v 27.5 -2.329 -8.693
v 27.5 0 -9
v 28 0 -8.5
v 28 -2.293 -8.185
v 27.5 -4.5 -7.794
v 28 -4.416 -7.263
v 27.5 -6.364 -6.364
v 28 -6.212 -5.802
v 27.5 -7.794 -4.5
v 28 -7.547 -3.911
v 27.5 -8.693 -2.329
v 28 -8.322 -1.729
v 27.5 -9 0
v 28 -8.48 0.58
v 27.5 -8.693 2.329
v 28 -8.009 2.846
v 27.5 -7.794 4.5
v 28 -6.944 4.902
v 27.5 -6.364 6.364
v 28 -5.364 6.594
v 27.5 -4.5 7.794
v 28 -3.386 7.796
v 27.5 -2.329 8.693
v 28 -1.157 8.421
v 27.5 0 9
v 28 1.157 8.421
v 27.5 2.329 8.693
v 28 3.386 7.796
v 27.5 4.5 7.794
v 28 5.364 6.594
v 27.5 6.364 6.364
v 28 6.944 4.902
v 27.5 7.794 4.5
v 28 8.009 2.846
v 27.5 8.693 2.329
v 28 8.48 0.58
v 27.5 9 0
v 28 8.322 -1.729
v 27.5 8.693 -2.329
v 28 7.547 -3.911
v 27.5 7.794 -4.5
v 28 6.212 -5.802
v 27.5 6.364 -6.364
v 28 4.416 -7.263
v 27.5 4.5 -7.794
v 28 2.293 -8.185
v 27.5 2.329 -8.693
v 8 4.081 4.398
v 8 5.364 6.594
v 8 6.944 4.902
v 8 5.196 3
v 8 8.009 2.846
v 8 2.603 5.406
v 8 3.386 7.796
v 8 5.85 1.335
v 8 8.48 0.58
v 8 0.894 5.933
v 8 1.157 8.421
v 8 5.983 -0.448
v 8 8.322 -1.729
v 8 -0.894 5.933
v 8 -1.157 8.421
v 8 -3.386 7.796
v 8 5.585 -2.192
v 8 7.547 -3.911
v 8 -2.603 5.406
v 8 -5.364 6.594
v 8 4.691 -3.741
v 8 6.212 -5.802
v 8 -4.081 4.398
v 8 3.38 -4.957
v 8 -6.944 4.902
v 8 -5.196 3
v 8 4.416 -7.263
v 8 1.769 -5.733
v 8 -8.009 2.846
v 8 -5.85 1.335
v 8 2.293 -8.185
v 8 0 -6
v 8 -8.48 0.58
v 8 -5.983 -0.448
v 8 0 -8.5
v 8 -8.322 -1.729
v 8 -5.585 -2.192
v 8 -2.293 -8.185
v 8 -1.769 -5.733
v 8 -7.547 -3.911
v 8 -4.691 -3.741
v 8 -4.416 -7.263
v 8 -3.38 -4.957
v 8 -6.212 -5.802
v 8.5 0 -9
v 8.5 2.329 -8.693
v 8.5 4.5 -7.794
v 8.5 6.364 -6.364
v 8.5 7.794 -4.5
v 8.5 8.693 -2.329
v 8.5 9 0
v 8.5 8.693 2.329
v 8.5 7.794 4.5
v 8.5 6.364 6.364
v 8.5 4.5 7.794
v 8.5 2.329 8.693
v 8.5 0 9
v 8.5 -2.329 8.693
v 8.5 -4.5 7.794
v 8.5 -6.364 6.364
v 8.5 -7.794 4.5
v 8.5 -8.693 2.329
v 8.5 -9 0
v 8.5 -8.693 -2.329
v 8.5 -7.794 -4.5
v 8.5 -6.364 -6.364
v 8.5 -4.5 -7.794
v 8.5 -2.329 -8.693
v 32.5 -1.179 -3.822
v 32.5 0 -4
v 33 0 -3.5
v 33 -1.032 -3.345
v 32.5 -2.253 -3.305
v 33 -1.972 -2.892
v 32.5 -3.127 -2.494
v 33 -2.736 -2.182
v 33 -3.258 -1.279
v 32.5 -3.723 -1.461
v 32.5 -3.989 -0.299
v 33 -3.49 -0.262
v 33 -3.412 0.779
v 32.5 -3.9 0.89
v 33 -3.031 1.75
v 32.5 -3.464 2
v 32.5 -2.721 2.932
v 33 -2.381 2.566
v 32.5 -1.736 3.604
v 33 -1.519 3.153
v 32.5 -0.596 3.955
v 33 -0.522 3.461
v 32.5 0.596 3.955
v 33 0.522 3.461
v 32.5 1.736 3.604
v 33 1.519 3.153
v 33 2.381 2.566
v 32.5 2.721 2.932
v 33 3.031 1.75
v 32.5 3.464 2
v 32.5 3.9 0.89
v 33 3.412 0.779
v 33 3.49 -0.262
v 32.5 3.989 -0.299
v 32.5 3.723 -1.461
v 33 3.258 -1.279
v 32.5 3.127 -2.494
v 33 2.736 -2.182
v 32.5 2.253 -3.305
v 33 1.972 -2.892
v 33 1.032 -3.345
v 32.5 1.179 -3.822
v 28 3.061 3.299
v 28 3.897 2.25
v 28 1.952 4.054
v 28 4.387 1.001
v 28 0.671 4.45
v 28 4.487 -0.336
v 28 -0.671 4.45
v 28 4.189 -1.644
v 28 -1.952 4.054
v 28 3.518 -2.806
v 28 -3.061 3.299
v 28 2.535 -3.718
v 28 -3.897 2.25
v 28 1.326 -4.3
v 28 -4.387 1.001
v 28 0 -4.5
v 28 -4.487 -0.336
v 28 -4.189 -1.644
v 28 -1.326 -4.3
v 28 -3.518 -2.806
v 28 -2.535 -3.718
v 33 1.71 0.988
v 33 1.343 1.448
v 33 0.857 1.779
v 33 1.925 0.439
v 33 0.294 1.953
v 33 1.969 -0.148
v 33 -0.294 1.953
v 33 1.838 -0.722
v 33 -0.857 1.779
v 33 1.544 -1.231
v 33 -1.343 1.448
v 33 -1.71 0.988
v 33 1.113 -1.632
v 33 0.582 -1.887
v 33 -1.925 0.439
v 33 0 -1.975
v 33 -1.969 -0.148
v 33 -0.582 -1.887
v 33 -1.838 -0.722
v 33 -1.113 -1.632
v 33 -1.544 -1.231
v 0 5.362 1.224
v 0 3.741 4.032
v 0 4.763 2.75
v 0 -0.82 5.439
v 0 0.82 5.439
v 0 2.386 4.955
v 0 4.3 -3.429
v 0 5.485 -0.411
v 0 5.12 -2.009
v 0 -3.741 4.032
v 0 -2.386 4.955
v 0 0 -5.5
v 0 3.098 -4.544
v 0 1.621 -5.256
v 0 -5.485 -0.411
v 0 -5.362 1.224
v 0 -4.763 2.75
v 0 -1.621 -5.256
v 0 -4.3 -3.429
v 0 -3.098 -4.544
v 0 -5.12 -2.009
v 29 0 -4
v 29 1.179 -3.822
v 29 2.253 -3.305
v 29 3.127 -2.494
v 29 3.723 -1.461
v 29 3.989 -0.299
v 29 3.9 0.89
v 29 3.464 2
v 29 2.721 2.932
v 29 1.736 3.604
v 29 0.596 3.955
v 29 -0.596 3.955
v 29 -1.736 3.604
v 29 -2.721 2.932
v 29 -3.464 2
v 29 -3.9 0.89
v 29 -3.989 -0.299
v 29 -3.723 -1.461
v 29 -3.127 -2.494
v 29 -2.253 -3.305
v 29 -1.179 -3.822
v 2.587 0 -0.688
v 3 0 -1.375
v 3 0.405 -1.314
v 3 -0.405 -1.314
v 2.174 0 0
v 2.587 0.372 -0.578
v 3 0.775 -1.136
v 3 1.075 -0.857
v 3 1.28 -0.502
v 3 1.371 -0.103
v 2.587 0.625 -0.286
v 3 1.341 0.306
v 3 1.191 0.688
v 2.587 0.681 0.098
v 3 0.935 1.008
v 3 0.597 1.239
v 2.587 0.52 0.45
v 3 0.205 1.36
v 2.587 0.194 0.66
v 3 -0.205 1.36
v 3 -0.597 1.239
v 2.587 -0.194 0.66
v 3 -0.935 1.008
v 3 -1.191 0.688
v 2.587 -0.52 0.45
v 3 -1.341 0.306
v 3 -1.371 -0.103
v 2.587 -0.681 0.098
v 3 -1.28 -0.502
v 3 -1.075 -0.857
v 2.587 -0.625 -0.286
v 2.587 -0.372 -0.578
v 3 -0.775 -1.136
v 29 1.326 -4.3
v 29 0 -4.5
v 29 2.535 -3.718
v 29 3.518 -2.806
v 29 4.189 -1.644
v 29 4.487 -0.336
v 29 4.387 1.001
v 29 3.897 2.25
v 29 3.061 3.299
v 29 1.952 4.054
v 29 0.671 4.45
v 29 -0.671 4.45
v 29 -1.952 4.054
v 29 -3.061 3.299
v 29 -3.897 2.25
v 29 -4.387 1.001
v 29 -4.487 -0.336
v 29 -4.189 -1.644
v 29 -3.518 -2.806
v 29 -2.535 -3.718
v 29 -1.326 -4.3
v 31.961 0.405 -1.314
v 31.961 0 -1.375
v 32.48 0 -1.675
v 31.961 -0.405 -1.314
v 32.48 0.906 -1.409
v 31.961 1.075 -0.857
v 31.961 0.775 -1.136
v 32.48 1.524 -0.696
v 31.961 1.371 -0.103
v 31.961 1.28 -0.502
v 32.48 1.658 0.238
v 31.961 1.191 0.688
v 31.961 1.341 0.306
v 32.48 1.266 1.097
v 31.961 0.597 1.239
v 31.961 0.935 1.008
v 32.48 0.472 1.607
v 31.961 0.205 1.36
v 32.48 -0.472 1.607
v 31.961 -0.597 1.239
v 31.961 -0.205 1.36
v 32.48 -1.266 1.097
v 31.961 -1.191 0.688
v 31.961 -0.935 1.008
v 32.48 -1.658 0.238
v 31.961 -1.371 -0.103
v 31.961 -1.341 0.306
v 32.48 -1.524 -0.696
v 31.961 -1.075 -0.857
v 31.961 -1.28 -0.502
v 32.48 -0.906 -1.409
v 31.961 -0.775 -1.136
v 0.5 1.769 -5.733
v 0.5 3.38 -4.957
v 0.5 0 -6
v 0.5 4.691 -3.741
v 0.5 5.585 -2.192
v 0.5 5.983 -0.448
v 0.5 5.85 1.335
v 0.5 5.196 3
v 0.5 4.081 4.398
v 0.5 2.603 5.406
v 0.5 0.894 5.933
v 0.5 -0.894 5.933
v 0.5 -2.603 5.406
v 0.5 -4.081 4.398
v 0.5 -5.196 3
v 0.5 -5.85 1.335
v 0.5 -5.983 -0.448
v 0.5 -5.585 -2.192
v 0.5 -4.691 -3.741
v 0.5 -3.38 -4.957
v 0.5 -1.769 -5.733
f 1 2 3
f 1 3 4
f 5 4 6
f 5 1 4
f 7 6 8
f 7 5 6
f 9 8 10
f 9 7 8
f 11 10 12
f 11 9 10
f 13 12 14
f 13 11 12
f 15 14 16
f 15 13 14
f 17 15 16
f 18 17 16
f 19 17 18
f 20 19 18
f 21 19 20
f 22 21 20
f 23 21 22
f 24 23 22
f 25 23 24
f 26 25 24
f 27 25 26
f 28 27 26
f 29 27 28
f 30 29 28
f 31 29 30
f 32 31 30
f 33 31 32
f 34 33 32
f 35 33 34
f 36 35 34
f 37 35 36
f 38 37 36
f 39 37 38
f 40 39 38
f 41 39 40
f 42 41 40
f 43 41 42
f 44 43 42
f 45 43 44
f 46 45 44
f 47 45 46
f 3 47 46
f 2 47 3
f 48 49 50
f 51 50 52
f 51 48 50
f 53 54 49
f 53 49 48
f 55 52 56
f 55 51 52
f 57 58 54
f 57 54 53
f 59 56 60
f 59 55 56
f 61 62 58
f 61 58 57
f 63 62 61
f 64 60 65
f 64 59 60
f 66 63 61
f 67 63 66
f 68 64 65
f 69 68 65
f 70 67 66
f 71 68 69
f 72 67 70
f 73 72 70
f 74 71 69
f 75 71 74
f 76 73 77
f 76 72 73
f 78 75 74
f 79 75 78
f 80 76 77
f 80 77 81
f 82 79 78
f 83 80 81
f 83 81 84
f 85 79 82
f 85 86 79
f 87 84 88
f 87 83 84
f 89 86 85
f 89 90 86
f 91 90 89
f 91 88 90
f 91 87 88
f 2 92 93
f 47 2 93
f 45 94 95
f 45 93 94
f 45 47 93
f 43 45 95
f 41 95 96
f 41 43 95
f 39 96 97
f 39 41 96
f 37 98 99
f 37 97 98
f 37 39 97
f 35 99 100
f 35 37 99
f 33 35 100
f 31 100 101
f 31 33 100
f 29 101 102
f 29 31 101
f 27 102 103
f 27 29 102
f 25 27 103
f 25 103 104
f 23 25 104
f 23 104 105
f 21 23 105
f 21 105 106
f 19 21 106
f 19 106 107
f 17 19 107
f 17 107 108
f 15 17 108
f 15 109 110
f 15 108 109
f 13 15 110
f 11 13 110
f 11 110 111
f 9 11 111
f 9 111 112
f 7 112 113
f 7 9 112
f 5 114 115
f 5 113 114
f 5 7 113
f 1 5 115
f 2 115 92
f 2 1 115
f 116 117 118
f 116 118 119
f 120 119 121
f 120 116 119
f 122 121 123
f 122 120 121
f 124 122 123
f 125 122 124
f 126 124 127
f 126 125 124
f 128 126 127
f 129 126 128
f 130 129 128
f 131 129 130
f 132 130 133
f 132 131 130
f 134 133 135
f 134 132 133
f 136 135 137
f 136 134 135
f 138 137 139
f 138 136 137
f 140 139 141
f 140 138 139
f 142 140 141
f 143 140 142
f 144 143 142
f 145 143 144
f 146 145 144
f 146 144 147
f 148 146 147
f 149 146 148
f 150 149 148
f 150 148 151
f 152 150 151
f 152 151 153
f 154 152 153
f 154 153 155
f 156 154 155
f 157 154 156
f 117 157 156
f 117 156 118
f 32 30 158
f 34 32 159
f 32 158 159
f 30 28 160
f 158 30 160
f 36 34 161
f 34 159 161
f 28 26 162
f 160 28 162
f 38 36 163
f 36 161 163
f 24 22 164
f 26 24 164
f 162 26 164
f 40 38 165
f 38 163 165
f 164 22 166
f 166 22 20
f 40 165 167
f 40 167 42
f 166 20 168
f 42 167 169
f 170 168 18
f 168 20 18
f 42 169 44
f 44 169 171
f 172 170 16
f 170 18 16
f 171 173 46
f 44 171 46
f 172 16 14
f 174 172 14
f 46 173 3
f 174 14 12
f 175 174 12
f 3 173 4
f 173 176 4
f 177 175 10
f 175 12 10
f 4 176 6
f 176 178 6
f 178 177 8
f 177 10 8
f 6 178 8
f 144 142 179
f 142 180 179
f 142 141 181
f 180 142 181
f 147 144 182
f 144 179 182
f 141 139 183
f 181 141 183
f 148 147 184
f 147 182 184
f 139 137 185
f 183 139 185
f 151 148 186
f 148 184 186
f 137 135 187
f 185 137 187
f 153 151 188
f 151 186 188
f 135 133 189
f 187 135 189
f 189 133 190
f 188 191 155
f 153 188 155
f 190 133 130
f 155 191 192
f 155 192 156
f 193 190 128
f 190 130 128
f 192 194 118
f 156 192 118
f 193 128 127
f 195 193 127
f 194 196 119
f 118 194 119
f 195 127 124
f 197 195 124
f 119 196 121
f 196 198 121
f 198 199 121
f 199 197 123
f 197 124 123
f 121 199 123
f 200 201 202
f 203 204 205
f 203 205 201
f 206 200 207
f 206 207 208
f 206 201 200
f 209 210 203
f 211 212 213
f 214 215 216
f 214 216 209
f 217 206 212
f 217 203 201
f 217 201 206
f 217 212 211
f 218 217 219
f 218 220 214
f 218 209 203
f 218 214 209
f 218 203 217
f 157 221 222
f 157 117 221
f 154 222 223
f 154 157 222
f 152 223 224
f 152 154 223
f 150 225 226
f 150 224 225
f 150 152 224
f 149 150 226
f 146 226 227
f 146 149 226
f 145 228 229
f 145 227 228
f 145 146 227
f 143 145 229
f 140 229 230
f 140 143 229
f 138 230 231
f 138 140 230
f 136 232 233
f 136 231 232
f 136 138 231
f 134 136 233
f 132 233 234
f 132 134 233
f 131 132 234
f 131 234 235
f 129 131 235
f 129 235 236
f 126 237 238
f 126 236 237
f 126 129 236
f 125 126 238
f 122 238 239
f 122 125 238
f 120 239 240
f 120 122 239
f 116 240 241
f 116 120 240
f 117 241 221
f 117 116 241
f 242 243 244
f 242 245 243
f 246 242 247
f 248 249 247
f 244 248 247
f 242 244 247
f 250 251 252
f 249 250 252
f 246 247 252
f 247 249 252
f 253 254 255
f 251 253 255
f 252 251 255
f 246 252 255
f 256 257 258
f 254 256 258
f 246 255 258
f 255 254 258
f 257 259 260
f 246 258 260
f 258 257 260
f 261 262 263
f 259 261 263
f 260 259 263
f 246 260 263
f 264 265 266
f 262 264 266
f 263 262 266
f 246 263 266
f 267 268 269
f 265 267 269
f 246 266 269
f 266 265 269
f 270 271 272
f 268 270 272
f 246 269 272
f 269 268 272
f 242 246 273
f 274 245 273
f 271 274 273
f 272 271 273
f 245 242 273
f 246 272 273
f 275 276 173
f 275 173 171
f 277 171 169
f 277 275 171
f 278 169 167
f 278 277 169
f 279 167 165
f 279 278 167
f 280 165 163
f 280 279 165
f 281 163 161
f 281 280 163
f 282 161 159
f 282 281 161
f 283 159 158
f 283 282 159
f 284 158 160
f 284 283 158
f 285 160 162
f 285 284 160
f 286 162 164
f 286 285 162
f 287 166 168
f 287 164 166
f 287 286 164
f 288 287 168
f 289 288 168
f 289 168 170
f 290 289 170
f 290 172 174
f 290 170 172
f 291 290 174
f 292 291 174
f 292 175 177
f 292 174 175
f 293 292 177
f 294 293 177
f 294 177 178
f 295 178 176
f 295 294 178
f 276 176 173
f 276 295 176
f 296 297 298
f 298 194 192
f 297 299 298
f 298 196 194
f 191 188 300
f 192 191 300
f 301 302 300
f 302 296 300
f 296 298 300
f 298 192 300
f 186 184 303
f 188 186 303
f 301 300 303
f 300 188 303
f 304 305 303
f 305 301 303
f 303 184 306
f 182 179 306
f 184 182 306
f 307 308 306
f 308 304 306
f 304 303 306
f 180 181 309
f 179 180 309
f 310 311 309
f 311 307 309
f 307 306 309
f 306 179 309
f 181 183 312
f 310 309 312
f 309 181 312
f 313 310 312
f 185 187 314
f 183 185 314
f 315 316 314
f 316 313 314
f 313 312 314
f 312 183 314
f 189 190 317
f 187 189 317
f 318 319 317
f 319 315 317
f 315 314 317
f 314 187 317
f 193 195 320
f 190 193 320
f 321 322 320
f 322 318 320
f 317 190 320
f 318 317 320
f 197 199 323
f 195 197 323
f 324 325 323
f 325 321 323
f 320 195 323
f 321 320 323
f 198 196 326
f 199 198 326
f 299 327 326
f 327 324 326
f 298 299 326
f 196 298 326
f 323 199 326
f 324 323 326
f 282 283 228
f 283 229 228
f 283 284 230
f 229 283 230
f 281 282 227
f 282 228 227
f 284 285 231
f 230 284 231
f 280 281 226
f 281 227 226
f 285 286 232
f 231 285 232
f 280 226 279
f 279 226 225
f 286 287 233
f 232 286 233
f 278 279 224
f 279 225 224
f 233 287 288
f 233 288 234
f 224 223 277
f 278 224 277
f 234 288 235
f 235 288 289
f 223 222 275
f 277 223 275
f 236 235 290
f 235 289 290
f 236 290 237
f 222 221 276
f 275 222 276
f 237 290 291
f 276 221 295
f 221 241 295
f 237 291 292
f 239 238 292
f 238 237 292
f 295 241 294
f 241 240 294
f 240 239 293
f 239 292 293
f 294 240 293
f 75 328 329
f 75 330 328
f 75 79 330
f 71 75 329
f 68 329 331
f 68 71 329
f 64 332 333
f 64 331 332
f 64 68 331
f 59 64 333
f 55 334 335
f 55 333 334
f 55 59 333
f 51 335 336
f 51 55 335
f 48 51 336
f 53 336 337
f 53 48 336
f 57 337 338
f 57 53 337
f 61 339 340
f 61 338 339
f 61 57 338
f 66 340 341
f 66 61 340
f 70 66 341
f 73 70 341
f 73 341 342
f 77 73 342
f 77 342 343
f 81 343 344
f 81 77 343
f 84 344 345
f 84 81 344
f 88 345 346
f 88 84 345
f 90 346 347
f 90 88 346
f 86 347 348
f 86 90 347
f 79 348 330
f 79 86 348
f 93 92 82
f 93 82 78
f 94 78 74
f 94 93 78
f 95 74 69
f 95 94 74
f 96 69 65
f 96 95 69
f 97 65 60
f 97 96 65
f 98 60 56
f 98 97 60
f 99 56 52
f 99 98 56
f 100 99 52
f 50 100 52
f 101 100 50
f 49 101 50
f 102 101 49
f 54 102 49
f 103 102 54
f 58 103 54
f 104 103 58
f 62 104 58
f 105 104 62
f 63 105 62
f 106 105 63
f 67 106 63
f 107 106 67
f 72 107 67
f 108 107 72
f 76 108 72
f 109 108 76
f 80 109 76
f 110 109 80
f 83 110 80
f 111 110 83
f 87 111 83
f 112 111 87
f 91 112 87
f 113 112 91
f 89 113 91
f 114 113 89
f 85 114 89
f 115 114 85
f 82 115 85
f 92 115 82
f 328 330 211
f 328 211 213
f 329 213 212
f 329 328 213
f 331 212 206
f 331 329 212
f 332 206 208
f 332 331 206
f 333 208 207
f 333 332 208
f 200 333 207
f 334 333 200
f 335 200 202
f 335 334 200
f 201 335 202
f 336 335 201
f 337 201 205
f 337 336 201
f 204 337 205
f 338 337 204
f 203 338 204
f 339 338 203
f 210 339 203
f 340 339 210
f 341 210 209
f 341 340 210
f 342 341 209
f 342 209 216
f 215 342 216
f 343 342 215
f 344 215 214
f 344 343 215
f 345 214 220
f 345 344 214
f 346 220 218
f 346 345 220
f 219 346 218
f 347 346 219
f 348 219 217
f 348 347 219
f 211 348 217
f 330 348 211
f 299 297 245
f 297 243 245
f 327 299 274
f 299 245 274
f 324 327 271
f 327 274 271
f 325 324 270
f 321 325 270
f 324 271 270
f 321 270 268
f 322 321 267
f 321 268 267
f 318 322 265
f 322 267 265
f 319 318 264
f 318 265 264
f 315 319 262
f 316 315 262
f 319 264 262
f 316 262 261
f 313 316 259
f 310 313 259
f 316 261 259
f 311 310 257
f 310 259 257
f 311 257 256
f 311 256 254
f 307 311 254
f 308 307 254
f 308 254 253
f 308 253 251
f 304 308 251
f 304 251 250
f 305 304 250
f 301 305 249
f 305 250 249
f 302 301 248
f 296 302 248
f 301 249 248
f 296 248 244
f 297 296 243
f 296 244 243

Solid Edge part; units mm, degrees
sketch "Sketch1" plane through (0, 0, 0) normal (0, -1, 0) x (1, 0, 0)
  line L0 (0, 0) -> (0, -6)
  line L1 (0, -6) -> (8, -6)
  line L2 (8, -6) -> (8, -9)
  line L3 (8, -9) -> (28, -9)
  line L4 (28, -9) -> (28, -4.5)
  line L5 (28, -4.5) -> (29, -4.5)
  line L6 (29, -4.5) -> (29, -4)
  line L7 (29, -4) -> (33, -4)
  line L8 (33, -4) -> (33, 0)
  dimension "D1" = 8
  dimension "D2" = 20
  dimension "D3" = 4
  dimension "D4" = 1
revolve "RevolvedProtrusion1" add sketch "Sketch1" angle 360 about axis through (14, 0, 0) along (-1, 0, 0)
chamfer "Chamfer1" distance 0.5 angle 45 4 edges at (0, 0, 6) (33, 0, 4) (8, 0, 9) (28, 0, 9)
hole "Hole_1" at (33, 0, 0) direction (-1, 0, 0) diameter 2.75 depth 30 tip angle 118 start chamfer 0.6 start chamfer angle 30 end chamfer 0.6 end chamfer angle 30
properties material "Polyethylene, low density"
